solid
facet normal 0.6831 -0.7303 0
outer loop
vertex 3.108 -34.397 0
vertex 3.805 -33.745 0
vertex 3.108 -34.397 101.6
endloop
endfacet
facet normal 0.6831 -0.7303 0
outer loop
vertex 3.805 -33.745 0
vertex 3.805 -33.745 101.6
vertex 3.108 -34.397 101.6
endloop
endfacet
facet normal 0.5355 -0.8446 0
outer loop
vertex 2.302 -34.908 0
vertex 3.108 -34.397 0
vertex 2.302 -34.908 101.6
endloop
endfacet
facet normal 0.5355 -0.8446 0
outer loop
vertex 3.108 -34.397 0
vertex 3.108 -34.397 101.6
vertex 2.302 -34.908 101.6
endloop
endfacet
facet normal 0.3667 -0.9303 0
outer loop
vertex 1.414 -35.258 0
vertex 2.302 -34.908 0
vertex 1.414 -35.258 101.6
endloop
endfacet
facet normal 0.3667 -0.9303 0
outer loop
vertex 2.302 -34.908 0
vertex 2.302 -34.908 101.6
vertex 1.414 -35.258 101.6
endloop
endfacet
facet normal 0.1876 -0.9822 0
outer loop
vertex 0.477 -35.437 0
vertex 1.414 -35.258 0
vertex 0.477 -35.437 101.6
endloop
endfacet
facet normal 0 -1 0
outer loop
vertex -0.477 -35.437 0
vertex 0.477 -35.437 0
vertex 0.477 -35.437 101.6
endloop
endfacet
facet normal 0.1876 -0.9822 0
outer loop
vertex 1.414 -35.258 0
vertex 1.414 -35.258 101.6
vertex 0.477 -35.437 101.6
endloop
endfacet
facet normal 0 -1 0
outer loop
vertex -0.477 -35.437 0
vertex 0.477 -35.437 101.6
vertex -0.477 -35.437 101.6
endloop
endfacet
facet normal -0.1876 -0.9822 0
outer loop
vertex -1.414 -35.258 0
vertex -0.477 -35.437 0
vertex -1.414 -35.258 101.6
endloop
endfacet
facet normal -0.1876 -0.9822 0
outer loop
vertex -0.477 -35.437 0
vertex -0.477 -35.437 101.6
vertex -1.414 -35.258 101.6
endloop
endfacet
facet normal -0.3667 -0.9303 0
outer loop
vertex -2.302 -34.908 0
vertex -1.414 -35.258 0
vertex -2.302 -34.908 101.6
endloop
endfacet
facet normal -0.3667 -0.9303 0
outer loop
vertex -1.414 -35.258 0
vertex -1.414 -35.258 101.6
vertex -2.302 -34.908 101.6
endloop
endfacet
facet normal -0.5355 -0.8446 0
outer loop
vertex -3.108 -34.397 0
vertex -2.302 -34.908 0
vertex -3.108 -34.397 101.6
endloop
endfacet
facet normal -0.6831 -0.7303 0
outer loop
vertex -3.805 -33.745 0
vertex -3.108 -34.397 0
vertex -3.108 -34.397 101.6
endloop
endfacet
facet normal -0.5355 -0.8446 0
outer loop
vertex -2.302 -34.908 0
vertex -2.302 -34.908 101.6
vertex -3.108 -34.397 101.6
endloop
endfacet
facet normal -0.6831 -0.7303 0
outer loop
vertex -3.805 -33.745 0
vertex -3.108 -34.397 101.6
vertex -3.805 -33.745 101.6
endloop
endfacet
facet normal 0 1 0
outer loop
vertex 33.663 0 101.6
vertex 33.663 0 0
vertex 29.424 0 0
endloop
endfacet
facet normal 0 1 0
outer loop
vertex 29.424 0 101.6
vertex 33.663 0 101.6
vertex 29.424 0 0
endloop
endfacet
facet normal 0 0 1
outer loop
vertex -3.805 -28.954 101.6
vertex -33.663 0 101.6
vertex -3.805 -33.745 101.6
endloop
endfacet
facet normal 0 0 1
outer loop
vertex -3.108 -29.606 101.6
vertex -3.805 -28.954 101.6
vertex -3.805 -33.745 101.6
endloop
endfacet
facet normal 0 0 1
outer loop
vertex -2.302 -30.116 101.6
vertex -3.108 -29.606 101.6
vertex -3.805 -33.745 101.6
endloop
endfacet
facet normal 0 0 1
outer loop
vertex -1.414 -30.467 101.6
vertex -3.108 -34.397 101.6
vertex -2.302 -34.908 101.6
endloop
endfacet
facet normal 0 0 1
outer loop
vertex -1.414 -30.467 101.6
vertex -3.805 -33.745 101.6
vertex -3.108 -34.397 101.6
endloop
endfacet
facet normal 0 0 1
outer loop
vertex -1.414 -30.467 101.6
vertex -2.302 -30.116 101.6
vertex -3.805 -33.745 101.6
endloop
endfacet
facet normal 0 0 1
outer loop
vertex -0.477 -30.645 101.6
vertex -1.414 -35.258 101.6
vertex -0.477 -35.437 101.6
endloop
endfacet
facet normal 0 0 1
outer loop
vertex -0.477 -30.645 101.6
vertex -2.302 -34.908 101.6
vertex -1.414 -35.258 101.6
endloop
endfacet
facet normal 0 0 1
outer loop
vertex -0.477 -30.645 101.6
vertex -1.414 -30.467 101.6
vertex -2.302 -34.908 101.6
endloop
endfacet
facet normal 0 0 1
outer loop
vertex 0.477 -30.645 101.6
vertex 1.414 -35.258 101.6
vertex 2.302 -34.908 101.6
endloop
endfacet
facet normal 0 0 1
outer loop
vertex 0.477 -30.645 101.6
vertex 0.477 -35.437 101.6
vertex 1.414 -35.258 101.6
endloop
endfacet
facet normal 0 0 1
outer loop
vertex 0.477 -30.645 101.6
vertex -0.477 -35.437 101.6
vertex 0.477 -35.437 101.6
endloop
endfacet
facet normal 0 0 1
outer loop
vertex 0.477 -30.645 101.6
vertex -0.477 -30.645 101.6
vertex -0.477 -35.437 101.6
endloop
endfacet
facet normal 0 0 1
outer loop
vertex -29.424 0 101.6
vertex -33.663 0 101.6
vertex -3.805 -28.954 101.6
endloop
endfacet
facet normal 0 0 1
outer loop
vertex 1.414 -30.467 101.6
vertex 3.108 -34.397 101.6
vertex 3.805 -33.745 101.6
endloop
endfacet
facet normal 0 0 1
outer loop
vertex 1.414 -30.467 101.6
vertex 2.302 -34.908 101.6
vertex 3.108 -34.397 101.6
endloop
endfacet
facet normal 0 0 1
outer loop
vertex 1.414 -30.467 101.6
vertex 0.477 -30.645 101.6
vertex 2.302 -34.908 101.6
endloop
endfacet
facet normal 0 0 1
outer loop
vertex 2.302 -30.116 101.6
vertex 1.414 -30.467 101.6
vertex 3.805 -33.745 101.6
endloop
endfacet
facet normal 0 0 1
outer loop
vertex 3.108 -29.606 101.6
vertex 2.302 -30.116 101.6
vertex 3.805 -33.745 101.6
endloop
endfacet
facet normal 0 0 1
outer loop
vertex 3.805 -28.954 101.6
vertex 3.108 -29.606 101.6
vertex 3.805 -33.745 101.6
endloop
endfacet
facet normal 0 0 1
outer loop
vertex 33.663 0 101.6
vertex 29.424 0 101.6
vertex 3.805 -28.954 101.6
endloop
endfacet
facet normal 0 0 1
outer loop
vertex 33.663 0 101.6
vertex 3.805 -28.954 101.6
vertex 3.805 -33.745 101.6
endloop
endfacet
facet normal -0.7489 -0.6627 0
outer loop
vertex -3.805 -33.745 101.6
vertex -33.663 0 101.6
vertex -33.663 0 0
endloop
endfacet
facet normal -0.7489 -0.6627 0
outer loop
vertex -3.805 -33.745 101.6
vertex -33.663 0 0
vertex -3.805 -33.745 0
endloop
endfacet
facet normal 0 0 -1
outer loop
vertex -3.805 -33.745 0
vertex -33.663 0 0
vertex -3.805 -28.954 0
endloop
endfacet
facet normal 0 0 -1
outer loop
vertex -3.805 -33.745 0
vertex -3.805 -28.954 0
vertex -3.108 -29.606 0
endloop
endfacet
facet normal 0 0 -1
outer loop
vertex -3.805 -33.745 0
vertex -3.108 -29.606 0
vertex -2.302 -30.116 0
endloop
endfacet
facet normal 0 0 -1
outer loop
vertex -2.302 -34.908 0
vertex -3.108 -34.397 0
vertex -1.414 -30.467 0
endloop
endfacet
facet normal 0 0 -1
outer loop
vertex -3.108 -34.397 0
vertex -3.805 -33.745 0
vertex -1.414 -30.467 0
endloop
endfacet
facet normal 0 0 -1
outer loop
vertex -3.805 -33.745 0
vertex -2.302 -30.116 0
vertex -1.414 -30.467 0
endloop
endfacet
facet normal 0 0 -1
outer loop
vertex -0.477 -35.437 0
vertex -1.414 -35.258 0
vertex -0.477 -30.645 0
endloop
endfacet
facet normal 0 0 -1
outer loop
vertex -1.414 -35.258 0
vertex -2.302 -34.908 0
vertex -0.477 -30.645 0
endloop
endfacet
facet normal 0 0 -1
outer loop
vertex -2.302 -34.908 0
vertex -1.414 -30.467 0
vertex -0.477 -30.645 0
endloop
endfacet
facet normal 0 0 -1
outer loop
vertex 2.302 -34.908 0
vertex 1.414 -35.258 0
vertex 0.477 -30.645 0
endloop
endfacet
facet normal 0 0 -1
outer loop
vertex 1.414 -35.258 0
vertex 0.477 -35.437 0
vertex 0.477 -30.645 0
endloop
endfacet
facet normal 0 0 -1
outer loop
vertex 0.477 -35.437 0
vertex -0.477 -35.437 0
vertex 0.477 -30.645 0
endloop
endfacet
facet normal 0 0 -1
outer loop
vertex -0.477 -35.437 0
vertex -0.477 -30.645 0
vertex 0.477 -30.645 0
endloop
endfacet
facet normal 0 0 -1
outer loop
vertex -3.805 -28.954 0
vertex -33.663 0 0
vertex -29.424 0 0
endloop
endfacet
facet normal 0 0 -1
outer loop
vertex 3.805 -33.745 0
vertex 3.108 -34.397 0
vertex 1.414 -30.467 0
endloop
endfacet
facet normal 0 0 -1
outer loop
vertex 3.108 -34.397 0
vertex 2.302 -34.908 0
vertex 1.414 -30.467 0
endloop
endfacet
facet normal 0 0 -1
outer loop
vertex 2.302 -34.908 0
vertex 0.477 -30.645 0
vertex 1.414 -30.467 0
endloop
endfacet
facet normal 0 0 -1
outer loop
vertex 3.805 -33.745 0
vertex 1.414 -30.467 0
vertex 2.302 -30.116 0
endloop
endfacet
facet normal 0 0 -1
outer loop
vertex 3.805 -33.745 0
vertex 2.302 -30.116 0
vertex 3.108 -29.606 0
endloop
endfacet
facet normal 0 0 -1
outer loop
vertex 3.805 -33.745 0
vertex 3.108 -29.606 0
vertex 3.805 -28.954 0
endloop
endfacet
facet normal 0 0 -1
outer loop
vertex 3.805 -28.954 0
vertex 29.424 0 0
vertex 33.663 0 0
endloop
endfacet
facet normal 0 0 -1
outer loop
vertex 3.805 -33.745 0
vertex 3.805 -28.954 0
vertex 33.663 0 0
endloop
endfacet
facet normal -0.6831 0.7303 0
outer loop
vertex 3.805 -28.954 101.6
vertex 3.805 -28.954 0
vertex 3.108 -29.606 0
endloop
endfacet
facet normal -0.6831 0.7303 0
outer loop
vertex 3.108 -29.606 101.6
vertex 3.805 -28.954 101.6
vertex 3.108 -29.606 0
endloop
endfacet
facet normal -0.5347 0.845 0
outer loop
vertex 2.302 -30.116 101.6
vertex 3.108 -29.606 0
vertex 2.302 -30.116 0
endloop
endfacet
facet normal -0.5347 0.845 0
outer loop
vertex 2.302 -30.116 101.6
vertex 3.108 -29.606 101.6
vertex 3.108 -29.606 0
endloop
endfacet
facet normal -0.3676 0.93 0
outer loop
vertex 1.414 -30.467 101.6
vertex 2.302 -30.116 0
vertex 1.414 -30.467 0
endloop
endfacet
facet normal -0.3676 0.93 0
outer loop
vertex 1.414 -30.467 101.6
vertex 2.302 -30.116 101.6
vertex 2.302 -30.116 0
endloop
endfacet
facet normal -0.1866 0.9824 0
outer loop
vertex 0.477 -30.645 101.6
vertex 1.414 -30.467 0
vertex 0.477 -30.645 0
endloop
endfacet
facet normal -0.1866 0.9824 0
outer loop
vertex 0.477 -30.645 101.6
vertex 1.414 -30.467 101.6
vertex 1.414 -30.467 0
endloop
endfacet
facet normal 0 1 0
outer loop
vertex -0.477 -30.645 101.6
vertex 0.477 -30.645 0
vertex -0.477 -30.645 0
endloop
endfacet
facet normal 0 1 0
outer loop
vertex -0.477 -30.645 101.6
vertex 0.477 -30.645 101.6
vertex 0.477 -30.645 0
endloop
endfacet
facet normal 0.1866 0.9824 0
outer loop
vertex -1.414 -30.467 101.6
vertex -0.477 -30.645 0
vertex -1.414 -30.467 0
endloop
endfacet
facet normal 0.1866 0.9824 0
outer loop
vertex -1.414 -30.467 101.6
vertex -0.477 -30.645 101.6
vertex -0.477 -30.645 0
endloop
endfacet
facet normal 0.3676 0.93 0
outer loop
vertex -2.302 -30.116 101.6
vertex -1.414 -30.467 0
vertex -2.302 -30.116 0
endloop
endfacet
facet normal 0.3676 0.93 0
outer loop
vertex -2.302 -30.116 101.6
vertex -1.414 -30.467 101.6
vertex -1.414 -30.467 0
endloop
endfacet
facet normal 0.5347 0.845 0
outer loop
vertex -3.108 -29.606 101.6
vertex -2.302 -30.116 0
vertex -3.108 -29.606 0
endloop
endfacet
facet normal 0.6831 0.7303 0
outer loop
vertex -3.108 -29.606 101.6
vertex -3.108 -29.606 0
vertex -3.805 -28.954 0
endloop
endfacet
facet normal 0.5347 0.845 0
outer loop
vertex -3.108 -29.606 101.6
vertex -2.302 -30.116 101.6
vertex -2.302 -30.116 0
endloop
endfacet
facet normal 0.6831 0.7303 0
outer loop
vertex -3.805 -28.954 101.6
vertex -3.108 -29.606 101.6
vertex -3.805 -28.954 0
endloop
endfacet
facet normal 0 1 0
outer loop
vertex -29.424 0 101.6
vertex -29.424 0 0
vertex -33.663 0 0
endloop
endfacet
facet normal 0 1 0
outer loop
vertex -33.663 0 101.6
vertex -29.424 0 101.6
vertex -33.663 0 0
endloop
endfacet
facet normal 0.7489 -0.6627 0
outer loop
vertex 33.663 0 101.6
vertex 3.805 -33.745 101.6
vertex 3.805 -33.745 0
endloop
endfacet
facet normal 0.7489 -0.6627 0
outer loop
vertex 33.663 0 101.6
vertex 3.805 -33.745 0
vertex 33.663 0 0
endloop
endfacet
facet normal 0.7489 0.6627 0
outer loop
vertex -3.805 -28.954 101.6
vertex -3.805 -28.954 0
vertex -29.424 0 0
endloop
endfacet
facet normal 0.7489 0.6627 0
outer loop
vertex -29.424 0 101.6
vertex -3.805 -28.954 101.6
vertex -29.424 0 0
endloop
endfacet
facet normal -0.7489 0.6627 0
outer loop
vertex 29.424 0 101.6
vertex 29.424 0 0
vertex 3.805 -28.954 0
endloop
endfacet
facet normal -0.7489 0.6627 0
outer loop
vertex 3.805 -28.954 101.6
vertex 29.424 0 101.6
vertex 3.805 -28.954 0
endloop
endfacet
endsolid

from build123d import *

# Parameters (mm, degrees)
F1_DEPTH = 101.6
F2_R     = 5.08
F3_R     = 5.08


with BuildPart() as f1:
    # F0 (on Top) → F1 (new body)
    with BuildSketch(Plane.XY):
        Polygon((-33.663134, 0), (0, -38.04515), (33.663134, 0), (29.423697, 0), (0, -33.253855), (-29.423697, 0), align=None)
    extrude(amount=F1_DEPTH)

    # F2
    f2_edges = [f1.edges().sort_by_distance(p)[0] for p in [
        (0, -33.253855, 50.8),
    ]]
    fillet(f2_edges, radius=F2_R)

    # F3
    f3_edges = [f1.edges().sort_by_distance(p)[0] for p in [
        (0, -38.04515, 50.8),
    ]]
    fillet(f3_edges, radius=F3_R)


solid = f1.part
